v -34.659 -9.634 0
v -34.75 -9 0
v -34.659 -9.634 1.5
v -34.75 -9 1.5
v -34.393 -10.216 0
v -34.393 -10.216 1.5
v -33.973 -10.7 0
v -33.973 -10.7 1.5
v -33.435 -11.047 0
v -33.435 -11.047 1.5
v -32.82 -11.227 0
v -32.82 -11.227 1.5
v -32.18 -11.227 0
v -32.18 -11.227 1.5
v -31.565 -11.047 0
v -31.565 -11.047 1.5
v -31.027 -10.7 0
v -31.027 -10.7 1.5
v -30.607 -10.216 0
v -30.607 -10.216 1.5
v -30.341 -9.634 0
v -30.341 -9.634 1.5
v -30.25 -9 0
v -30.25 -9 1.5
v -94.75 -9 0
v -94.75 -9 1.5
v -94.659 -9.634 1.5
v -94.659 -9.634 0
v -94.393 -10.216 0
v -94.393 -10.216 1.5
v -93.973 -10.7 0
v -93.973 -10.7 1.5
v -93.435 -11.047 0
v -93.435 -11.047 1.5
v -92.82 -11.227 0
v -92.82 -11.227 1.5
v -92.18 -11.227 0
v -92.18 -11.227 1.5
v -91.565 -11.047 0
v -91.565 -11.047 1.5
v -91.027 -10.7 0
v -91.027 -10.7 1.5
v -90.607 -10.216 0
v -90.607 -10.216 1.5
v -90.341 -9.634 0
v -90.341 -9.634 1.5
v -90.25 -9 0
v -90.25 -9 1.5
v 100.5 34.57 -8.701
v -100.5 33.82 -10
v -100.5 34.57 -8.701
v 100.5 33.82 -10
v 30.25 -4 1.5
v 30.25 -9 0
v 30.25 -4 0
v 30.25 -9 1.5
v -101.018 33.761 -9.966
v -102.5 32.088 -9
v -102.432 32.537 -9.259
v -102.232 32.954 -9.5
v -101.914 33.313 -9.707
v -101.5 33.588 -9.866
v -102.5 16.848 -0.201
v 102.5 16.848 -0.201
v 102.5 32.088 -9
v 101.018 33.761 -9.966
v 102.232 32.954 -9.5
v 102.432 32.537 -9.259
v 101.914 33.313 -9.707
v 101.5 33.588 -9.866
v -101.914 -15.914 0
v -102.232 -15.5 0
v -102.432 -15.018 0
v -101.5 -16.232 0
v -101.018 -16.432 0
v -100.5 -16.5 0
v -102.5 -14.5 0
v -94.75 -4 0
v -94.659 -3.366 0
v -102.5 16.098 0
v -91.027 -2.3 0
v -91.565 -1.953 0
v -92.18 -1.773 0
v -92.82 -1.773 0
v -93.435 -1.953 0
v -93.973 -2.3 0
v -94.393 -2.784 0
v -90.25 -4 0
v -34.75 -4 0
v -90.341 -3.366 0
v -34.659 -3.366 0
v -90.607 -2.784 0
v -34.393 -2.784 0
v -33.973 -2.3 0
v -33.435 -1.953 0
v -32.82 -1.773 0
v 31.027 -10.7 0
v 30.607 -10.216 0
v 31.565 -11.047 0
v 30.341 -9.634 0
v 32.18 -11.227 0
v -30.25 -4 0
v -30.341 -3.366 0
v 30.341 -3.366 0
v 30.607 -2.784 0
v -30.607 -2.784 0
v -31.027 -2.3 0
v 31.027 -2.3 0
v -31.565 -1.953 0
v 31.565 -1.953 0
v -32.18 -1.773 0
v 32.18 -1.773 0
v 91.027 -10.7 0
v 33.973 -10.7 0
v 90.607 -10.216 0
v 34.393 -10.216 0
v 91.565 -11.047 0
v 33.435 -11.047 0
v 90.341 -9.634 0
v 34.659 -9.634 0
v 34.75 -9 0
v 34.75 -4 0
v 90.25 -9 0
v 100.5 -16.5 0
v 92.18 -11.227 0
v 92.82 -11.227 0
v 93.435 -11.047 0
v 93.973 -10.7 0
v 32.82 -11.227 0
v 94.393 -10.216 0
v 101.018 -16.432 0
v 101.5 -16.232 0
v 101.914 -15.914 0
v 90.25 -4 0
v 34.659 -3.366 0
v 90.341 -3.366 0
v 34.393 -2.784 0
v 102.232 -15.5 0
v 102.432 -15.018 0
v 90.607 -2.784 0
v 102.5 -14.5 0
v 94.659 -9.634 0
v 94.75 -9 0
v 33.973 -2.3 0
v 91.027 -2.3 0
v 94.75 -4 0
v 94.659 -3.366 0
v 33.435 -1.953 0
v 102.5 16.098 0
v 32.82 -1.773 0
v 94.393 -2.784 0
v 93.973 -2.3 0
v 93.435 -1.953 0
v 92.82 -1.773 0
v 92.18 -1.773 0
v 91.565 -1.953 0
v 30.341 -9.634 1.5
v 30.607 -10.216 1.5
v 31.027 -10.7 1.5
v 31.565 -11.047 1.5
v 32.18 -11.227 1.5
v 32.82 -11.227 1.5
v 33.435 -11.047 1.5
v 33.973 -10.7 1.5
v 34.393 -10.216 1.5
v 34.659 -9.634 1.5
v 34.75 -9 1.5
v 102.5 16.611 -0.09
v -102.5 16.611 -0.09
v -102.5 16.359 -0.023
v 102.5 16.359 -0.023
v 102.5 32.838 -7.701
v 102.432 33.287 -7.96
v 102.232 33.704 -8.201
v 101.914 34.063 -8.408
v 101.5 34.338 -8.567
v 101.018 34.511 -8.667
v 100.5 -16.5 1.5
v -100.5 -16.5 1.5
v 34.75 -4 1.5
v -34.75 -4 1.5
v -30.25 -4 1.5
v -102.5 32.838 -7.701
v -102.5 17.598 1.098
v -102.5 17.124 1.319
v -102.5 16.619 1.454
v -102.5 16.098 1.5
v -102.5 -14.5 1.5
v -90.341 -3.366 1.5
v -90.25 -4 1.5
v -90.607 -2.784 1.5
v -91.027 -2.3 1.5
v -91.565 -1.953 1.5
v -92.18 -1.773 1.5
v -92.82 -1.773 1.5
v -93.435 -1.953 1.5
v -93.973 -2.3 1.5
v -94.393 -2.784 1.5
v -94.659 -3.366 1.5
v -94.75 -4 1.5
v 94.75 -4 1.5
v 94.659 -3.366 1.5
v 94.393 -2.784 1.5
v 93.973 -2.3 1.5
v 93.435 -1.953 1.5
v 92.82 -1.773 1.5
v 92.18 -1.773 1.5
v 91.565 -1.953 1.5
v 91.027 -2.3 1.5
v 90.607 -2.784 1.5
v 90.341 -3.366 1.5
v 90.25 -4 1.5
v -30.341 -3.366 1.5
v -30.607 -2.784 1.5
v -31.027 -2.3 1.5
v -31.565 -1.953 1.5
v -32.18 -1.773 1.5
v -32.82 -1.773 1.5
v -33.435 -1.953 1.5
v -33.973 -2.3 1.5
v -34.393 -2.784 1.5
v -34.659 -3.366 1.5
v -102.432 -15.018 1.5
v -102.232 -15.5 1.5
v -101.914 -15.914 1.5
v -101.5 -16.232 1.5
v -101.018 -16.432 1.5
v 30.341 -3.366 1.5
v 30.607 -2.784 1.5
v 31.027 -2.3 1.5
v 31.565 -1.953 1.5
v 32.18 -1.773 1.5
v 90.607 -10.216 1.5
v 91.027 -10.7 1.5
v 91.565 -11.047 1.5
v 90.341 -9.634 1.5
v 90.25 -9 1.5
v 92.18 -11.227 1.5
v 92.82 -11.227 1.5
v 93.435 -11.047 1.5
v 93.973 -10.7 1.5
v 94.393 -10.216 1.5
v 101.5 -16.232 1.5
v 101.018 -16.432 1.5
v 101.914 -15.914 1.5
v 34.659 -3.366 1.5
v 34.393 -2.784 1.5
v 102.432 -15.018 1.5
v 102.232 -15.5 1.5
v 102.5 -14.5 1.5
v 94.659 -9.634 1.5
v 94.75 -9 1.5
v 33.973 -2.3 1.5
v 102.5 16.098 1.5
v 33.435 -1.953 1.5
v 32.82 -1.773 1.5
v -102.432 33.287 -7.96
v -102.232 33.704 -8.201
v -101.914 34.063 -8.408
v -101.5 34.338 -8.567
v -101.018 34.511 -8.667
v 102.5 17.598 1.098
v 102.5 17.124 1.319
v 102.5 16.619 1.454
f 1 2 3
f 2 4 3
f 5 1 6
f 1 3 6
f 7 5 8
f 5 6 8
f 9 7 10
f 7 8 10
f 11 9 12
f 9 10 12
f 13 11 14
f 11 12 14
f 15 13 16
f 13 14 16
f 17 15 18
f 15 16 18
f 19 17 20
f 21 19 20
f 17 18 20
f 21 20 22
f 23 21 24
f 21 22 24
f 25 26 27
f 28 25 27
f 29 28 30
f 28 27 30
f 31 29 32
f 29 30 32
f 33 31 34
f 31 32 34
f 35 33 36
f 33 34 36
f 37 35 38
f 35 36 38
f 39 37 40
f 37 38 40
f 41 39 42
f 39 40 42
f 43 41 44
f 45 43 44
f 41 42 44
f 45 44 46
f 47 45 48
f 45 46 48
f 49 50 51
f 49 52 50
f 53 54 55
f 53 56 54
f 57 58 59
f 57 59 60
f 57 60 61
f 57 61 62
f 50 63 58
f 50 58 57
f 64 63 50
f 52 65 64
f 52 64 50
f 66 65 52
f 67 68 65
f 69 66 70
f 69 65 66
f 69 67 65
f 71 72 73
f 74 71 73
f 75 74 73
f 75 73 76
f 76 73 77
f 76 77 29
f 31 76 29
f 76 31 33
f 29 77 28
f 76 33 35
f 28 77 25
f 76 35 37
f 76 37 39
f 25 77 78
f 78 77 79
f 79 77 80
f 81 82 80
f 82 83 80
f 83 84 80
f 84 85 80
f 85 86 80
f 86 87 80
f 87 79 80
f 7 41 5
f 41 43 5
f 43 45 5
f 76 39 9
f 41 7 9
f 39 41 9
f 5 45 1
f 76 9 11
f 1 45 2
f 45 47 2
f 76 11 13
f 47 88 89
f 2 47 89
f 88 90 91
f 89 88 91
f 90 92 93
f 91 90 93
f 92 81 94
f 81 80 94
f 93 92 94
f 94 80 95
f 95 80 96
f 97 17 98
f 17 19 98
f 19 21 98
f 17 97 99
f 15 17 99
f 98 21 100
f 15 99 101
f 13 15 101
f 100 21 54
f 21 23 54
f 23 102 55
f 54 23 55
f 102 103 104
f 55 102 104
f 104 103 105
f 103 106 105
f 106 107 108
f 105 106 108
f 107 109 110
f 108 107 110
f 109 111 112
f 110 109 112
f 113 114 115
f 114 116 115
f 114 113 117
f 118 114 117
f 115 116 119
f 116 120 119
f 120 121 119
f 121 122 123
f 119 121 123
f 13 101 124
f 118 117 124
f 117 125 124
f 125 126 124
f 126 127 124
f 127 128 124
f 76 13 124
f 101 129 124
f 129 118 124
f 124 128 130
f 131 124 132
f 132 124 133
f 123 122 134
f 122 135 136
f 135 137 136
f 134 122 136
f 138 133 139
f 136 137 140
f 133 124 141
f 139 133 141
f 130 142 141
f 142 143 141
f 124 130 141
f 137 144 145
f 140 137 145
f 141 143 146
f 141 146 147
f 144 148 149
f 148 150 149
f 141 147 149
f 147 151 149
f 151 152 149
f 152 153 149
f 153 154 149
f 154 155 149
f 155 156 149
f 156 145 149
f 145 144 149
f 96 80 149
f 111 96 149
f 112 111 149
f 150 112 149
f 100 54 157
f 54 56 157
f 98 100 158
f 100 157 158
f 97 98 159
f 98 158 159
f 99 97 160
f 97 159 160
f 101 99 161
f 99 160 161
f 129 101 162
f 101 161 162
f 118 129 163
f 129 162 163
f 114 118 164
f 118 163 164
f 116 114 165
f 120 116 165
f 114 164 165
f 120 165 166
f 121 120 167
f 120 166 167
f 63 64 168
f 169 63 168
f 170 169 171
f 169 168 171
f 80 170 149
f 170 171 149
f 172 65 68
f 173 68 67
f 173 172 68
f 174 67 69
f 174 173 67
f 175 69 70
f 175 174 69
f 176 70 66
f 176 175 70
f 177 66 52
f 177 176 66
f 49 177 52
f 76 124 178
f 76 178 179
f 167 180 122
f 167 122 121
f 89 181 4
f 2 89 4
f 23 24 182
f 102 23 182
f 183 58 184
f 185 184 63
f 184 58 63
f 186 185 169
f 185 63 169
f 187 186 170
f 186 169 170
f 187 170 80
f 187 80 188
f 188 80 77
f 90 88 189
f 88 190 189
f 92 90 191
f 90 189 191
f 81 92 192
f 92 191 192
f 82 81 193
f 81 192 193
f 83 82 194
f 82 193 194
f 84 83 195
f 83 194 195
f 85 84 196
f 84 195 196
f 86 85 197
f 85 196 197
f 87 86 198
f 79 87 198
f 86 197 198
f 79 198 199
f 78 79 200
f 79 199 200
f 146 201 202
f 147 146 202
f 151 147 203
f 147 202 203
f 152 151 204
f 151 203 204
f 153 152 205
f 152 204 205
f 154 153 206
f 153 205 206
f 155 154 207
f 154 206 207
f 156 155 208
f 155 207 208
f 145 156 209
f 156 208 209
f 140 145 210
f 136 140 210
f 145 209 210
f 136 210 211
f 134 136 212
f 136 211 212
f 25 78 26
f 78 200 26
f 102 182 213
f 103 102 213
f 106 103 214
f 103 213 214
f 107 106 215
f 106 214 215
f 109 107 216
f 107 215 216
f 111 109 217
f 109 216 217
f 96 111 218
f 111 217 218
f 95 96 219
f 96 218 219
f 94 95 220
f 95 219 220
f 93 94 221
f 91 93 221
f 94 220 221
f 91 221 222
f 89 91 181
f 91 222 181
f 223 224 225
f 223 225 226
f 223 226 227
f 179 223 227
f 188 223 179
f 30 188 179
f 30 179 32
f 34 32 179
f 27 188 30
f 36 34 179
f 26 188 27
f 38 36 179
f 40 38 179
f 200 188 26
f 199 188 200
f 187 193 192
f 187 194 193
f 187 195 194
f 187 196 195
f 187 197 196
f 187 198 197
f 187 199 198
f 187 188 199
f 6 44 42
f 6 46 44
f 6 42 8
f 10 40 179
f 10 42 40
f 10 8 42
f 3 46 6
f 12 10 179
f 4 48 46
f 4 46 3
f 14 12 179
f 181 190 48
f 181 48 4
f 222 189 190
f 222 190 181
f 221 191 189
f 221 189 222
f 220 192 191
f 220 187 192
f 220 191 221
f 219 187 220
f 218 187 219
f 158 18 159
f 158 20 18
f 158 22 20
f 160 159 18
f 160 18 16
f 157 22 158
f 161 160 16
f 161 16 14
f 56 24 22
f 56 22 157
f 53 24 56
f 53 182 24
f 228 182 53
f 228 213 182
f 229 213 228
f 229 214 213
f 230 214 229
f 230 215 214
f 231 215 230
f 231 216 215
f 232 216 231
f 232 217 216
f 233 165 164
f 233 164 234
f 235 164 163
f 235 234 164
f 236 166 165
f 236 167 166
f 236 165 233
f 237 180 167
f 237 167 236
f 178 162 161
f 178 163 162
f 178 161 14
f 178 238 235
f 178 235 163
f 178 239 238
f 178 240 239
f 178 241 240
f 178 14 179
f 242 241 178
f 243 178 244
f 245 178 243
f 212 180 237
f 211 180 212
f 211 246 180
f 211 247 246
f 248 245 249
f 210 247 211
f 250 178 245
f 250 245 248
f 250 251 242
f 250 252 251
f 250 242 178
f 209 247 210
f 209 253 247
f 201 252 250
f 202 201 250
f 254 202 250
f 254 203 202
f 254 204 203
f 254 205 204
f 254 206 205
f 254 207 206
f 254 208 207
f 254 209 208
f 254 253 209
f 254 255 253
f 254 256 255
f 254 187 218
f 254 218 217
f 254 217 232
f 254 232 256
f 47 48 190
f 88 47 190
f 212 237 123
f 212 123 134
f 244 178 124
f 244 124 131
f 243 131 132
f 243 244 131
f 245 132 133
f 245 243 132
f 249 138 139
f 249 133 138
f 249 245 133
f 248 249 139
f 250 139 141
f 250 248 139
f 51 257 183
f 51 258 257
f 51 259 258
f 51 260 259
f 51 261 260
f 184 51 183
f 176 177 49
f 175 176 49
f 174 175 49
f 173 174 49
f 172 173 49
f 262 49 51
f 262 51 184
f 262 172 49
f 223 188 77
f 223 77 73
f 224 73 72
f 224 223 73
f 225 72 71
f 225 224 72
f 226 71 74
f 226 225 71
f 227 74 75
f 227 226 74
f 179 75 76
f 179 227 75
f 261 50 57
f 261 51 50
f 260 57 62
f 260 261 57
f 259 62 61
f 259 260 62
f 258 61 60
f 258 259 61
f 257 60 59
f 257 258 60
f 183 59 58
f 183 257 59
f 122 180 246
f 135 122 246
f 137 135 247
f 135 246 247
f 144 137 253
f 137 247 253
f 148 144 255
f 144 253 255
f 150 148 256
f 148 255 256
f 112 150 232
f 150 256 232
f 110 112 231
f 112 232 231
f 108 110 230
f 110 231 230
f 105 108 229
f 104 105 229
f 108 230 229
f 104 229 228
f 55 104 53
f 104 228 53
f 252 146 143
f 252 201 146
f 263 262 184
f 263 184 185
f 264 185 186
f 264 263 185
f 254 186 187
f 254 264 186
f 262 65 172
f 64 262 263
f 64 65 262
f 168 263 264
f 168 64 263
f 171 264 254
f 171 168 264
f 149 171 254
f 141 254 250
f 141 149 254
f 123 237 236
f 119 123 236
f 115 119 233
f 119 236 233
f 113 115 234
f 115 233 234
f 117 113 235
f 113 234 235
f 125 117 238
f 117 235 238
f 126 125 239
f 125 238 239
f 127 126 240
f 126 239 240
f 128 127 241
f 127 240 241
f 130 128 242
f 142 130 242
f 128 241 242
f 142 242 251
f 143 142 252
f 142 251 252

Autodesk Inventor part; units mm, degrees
ref_plane "YZ Plane" through (0, 0, 0) normal (1, 0, 0) x (0, 1, 0)
ref_plane "XZ Plane" through (0, 0, 0) normal (0, 1, 0) x (-1, 0, 0)
ref_plane "XY Plane" through (0, 0, 0) normal (0, 0, 1) x (1, 0, 0)
sketch "スケッチ1" plane through (0, 0, 0) normal (0, 0, 1) x (1, 0, 0)
  line L0 (102.5, -16.5) -> (-102.5, -16.5)
  line L1 (-102.5, -16.5) -> (-102.5, 16.5)
  line L2 (-102.5, 16.5) -> (102.5, 16.5)
  line L3 (102.5, 16.5) -> (102.5, -16.5)
  line L4 (102.5, -16.5) -> (-102.5, 16.5) construction
  line L5 (-102.5, -16.5) -> (102.5, 16.5) construction
  point P0 (0, 0)
  dimension "d0" = 205
  dimension "d1" = 33
extrude "プレート1" add sketch "スケッチ1" along normal blind 1.5
sketch "スケッチ2" plane through (102.5, 16.5, 0) normal (0, 0.5, 0.8660254) x (-1, 0, 0)
  line L0 (205, 0) -> (0, 0)
  line L1 (0, 0) -> (0, -20)
  line L2 (0, -20) -> (205, -20)
  line L3 (205, -20) -> (205, 0)
edge flange "フランジ1" height 20 angle 30 thickness 1.5 bend radius 1.5 thickness toward (0, 0.5, 0.8660254) relief tear relief width 1.5 relief depth 0.75 edges at (0, 16.5, 0) wall of the first edge with corners at (-102.5, 16.5, 0) (102.5, 16.5, 0) (102.5, 33.8205, -10) (-102.5, 33.8205, -10)
bend "曲げ1"
corner "コーナー1"
sketch "スケッチ3" plane through (0, 0, 1.5) normal (0, 0, 1) x (1, 0, 0)
  line L0 (102.5, 16.0981) -> (-102.5, 16.0981) projected
  line L1 (-102.5, -16.5) -> (-102.5, 16.0981) projected
  line L2 (102.5, -16.5) -> (-102.5, -16.5) projected
  line L3 (102.5, 16.0981) -> (102.5, -16.5) projected
  point P0 (0, 0)
  point P1 (-92.5, -6.5)
  point P2 (92.5, -6.5)
  point P3 (-32.5, -6.5)
  point P4 (32.5, -6.5)
  dimension "d13" = 10
  dimension "d14" = 10
  dimension "d15" = 10
  dimension "d16" = 185
  dimension "d32" = 60
  dimension "d33" = 60
hole "穴1" at (-92.5, -6.5, 1.5) at (92.5, -6.5, 1.5) at (-32.5, -6.5, 1.5) at (32.5, -6.5, 1.5) direction (0, 0, -1) diameter 4.5 end through all
fillet "フィレット1" radius 2 4 edges at (-102.5, -16.5, 0.75) (-102.5, 34.1955, -9.3505) (102.5, 34.1955, -9.3505) (102.5, -16.5, 0.75)
sketch "スケッチ4" plane through (0, 0, 1.5) normal (0, 0, 1) x (1, 0, 0)
  circle A0 centre (-32.5, -6.5) radius 2.25 projected
  circle A1 centre (-92.5, -6.5) radius 2.25 projected
  circle A2 centre (92.5, -6.5) radius 2.25 projected
  circle A3 centre (32.5, -6.5) radius 2.25 projected
  arc A4 (100.5, -16.5) -> (102.5, -14.5) centre (100.5, -14.5) ccw projected
  line L0 (102.5, 16.0981) -> (102.5, -14.5) projected
  line L1 (102.5, 16.0981) -> (-102.5, 16.0981) projected
  line L2 (-102.5, -14.5) -> (-102.5, 16.0981) projected
  arc A5 (-102.5, -14.5) -> (-100.5, -16.5) centre (-100.5, -14.5) ccw projected
  line L3 (100.5, -16.5) -> (-100.5, -16.5) projected
  line L4 (-92.5, -4) -> (-92.5, -9) construction
  line L5 (-94.75, -4) -> (-94.75, -9)
  line L6 (-90.25, -9) -> (-90.25, -4)
  arc A6 (-90.25, -4) -> (-94.75, -4) centre (-92.5, -4) ccw
  arc A7 (-94.75, -9) -> (-90.25, -9) centre (-92.5, -9) ccw
  line L7 (-32.5, -9) -> (-32.5, -4) construction
  line L8 (-30.25, -9) -> (-30.25, -4)
  line L9 (-34.75, -4) -> (-34.75, -9)
  arc A8 (-34.75, -9) -> (-30.25, -9) centre (-32.5, -9) ccw
  arc A9 (-30.25, -4) -> (-34.75, -4) centre (-32.5, -4) ccw
  line L10 (32.5, -9) -> (32.5, -4) construction
  circle A10 centre (32.5, -6.5) radius 2.25 projected
  line L11 (30.25, -9) -> (30.25, -4)
  line L12 (34.75, -4) -> (34.75, -9)
  arc A11 (30.25, -9) -> (34.75, -9) centre (32.5, -9) ccw
  arc A12 (34.75, -4) -> (30.25, -4) centre (32.5, -4) ccw
  line L13 (92.5, -9) -> (92.5, -4) construction
  line L14 (90.25, -9) -> (90.25, -4)
  line L15 (94.75, -4) -> (94.75, -9)
  arc A13 (90.25, -9) -> (94.75, -9) centre (92.5, -9) ccw
  arc A14 (94.75, -4) -> (90.25, -4) centre (92.5, -4) ccw
  circle A15 centre (-32.5, -6.5) radius 2.25 projected
  circle A16 centre (-92.5, -6.5) radius 2.25 projected
  point P0 (0, 0)
  dimension "d34" = 5
extrude "押し出し1" cut sketch "スケッチ4" against normal blind 10 contours A0 | L8 A8 L9 A0 | A0 L9 A9 L8 | A1 | L6 A7 L5 A1 | A1 L5 A6 L6 | A2 | L15 A13 L14 A2 | A2 L14 A14 L15 | A3 | L12 A11 L11 A3 | A3 L11 A12 L12
equation "\"d29\" = Thickness"
equation "\"d2\" = Thickness"
equation "\"d3\" = BendReliefWidth"
equation "\"d4\" = BendReliefDepth"
equation "\"d5\" = MinimumRemnant"
equation "\"d6\" = TransitionRadius"
equation "\"d9\" = BendRadius"
equation "\"d10\" = CornerReliefSize"
equation "\"d11\" = GapSize"
equation "\"d12\" = JacobiRadiusSize"
equation "\"BendRadius\" = Thickness"
equation "\"BendReliefWidth\" = Thickness"
equation "\"BendReliefDepth\" = 0.5 * Thickness"
equation "\"CornerReliefSize\" = 4 * Thickness"
equation "\"MinimumRemnant\" = 2 * Thickness"
equation "\"TransitionRadius\" = BendRadius"
equation "\"JacobiRadiusSize\" = BendRadius"
equation "\"GapSize\" = Thickness"
equation "\"Thickness\" = 1.5"
properties part number "Scraper_Bar"
